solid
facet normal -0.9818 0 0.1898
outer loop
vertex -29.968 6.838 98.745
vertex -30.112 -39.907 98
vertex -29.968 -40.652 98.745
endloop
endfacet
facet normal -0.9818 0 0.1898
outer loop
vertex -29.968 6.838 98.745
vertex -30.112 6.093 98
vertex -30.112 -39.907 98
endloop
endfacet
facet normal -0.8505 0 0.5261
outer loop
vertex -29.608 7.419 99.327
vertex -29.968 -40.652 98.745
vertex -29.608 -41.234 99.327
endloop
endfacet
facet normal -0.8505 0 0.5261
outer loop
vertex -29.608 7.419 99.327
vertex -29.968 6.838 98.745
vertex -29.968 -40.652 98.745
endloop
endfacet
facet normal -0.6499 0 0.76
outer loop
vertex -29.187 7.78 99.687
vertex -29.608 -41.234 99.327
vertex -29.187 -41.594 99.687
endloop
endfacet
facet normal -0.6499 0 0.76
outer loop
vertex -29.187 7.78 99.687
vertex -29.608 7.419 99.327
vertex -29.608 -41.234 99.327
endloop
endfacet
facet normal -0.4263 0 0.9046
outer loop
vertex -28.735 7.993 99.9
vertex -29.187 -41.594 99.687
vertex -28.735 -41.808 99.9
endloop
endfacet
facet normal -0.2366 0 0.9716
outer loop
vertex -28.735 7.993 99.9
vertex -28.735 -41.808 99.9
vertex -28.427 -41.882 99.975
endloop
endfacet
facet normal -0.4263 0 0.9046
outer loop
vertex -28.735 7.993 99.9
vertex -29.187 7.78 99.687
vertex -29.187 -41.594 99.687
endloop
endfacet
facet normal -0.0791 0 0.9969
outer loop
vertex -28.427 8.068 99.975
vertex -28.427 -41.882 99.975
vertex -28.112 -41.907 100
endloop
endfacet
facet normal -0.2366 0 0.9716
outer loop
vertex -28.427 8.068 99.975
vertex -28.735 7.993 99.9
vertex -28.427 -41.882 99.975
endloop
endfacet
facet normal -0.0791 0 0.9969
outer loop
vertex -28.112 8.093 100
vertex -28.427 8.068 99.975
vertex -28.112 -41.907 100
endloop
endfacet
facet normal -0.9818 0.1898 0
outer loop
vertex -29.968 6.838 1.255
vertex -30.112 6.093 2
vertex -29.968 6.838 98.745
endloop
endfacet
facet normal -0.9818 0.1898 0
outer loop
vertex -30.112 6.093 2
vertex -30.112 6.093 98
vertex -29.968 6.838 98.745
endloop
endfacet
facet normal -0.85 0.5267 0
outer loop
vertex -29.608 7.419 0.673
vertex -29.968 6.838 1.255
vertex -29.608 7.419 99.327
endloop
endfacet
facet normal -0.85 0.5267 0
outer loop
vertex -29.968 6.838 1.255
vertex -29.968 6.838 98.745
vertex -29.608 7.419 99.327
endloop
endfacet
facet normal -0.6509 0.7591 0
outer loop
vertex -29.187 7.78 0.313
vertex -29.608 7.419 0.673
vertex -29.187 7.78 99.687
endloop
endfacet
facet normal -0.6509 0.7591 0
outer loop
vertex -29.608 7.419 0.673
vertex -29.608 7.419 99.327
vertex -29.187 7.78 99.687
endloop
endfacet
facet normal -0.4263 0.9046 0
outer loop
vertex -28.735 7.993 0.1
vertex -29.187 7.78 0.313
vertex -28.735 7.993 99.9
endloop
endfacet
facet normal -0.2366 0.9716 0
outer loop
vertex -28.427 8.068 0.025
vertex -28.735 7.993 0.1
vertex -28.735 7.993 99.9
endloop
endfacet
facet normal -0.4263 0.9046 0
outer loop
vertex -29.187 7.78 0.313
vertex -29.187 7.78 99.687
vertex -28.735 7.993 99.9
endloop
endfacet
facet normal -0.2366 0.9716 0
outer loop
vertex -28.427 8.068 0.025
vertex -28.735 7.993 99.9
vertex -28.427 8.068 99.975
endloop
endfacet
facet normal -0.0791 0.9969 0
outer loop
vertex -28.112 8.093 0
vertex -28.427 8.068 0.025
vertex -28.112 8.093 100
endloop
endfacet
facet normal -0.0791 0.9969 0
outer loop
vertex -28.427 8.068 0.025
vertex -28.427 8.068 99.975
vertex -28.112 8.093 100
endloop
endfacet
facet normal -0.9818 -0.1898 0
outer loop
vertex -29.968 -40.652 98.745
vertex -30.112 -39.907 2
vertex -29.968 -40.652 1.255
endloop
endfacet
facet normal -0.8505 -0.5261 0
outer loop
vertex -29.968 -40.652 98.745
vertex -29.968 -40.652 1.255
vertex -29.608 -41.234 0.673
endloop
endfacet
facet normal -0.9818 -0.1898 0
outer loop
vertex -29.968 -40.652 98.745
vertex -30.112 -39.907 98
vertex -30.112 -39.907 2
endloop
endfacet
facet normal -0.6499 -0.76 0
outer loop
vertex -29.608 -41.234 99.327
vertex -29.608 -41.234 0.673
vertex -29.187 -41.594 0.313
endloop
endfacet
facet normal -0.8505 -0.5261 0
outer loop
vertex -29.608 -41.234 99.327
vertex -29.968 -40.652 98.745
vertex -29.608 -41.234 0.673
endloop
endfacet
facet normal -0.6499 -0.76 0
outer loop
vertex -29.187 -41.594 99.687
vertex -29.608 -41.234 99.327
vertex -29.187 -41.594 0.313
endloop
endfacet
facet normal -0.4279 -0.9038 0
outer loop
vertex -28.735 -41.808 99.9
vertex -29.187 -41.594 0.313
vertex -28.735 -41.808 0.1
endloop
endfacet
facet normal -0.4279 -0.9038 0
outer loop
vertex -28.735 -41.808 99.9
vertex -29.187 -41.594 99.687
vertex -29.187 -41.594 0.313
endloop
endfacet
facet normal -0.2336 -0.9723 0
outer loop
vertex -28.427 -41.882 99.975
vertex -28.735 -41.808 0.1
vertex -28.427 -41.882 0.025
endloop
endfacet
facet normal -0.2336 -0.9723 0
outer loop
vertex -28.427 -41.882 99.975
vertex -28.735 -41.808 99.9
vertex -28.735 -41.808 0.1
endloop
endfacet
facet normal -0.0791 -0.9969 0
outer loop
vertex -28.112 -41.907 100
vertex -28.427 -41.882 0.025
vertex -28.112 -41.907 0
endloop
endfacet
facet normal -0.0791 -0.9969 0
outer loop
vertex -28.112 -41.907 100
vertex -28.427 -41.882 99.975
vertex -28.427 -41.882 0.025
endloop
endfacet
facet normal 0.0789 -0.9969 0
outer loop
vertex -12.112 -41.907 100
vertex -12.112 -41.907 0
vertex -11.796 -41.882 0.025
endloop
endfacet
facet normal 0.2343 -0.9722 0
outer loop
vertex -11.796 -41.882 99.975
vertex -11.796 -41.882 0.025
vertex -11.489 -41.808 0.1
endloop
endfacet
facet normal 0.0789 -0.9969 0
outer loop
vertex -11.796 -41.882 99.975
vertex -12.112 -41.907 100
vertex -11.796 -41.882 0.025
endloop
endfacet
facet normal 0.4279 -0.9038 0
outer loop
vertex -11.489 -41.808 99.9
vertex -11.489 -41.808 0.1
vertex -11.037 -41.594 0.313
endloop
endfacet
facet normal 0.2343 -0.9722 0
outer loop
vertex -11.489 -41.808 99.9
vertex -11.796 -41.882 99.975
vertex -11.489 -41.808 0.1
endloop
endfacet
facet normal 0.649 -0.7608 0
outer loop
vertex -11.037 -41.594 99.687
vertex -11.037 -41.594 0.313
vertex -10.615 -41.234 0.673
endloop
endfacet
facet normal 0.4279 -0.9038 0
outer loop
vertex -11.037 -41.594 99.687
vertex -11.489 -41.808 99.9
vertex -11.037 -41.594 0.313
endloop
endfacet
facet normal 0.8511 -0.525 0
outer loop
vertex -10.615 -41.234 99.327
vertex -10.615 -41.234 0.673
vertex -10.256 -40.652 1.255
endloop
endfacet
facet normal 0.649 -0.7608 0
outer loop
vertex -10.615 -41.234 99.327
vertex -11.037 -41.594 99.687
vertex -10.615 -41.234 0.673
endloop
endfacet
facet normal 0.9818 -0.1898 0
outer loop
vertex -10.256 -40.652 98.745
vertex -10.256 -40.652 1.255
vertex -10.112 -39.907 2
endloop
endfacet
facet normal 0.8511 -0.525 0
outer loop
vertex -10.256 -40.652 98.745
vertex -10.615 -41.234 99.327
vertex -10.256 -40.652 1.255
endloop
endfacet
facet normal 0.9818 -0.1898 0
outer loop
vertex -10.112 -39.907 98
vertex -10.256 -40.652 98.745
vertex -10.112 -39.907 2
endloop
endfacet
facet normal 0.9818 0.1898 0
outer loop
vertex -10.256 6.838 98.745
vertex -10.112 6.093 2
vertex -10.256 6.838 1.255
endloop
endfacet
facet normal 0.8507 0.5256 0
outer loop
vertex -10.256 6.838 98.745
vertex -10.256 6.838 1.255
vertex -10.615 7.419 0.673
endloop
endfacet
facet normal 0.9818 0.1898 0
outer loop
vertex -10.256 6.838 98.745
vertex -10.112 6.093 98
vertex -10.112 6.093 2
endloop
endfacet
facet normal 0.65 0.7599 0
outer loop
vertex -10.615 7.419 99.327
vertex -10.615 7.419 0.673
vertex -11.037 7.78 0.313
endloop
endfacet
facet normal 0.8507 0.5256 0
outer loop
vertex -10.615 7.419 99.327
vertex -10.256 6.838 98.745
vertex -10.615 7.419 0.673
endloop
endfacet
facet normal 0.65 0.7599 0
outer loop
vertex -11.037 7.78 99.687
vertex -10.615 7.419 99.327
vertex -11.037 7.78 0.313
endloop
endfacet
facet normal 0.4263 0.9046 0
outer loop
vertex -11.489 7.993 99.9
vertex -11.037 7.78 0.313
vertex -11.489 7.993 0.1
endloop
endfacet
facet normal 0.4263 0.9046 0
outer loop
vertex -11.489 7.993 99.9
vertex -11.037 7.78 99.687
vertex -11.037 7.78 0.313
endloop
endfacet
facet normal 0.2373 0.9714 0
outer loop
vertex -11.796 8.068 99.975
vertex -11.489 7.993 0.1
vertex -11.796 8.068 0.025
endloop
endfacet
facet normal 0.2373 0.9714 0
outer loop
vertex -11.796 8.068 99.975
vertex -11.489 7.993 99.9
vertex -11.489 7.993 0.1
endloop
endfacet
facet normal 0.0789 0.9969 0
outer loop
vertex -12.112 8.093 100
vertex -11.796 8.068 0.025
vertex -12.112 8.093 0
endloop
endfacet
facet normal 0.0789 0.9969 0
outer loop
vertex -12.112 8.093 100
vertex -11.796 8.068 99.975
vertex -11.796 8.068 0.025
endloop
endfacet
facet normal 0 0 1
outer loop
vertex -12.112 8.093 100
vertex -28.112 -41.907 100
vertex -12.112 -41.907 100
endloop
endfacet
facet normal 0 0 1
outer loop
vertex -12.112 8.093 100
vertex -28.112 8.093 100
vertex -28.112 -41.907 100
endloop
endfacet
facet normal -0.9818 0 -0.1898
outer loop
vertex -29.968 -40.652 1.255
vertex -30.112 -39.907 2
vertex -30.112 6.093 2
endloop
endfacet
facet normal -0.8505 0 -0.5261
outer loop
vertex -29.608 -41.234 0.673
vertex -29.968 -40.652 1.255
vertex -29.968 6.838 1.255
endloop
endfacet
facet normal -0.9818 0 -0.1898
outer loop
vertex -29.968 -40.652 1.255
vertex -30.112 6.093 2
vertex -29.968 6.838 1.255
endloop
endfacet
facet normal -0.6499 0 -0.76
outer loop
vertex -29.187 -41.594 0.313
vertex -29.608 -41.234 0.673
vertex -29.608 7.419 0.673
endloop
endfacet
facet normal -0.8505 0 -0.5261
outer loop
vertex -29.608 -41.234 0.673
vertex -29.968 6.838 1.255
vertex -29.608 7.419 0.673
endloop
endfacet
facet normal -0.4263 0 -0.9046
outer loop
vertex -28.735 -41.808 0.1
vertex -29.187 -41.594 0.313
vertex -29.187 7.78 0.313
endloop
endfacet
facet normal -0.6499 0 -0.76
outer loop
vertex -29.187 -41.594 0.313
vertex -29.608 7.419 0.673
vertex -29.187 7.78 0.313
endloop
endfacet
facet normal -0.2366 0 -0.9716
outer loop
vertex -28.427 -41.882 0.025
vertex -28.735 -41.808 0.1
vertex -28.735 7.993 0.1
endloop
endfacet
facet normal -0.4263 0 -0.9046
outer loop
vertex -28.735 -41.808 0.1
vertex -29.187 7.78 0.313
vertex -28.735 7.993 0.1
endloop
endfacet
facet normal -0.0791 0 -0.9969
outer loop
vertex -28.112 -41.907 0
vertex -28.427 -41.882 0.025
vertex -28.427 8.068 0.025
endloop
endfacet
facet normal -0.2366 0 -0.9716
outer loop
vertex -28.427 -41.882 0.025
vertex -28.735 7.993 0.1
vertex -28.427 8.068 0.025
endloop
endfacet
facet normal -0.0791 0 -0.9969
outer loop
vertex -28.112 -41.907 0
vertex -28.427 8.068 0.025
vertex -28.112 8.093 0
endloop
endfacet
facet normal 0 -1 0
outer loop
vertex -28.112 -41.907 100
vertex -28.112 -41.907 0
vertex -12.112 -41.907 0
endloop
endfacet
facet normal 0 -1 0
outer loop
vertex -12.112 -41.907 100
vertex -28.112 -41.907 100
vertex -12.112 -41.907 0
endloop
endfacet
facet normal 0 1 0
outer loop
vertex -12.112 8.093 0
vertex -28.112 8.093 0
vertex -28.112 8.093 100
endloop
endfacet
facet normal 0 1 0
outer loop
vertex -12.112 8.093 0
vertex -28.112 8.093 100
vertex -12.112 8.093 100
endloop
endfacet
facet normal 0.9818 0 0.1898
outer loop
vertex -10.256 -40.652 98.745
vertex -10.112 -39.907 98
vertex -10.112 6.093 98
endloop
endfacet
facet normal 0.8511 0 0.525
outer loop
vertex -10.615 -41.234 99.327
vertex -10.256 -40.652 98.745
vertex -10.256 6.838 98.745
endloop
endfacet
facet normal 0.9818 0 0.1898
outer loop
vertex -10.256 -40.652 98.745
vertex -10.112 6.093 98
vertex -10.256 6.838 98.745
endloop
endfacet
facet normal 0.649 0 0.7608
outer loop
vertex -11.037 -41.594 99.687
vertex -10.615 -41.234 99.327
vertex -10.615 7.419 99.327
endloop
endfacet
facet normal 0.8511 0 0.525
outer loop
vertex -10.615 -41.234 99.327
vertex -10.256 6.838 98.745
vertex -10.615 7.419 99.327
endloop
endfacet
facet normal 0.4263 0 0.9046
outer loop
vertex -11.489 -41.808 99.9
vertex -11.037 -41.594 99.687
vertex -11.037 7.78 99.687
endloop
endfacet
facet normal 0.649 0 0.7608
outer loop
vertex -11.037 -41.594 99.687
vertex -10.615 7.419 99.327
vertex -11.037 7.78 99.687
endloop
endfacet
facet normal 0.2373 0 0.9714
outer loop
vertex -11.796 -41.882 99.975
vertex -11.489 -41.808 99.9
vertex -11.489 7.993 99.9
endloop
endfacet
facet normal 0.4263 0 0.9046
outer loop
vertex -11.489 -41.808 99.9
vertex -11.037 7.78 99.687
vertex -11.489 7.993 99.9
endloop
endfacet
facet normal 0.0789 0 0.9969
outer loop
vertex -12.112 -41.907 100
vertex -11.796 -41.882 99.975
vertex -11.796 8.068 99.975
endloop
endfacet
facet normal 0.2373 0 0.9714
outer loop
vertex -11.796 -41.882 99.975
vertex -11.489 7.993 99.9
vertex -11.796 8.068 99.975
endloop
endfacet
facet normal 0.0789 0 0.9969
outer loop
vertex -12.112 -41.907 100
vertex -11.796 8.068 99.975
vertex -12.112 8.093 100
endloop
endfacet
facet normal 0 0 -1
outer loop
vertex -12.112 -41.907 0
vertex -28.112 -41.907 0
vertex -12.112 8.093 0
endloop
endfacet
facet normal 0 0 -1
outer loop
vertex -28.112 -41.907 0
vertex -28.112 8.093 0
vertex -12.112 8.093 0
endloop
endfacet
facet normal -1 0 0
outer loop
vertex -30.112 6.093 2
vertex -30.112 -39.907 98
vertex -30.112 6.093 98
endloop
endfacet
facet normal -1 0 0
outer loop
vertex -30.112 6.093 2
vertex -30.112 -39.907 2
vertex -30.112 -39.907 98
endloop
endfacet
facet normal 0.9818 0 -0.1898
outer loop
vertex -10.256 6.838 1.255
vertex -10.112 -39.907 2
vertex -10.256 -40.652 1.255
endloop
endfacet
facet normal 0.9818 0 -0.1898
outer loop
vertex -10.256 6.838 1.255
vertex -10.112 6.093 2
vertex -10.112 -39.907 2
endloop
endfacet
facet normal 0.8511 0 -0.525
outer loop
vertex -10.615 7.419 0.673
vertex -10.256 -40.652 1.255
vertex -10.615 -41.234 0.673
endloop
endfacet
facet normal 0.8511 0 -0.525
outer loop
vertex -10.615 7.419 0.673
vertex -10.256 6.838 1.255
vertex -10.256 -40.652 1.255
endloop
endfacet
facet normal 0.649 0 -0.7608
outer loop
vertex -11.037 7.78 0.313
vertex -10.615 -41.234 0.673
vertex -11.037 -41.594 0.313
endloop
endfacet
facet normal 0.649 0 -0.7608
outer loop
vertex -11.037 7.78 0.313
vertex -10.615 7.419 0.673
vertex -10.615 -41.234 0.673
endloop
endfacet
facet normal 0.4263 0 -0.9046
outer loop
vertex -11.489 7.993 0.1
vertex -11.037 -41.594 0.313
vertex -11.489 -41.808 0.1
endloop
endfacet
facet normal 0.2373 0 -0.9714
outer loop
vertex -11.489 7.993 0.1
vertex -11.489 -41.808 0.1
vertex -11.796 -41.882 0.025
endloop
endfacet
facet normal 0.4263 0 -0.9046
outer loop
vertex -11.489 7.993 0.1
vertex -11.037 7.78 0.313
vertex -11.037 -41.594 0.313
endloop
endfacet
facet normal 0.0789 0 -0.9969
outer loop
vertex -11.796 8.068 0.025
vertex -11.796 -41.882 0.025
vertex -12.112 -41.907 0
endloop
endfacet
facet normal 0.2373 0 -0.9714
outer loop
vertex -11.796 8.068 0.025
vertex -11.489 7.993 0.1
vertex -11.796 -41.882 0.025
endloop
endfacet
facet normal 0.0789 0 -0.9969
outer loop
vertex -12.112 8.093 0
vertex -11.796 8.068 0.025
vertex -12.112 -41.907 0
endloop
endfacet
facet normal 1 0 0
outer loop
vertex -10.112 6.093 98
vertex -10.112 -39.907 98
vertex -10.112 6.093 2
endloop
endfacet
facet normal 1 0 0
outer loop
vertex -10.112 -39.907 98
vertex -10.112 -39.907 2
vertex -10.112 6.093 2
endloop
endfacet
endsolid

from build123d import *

# Parameters (mm, degrees)
CROQUIS1_W              = 20
CROQUIS1_H              = 50
SALIENTE_EXTRUIR1_DEPTH = 100
REDONDEO1_R             = 2


with BuildPart() as part:
    # Croquis1 → Saliente-Extruir1 (new body)
    with BuildSketch(Plane.XY):
        with Locations((-20.111803819, -16.907191939)):
            Rectangle(CROQUIS1_W, CROQUIS1_H)
    extrude(amount=SALIENTE_EXTRUIR1_DEPTH)

    # Redondeo1
    redondeo1_edges = [part.edges().sort_by_distance(p)[0] for p in [
        (-10.111803819, -16.907191939, 100),
        (-30.111803819, -16.907191939, 100),
        (-10.111803819, -16.907191939, 0),
        (-30.111803819, -16.907191939, 0),
        (-30.111803819, 8.092808061, 50),
        (-10.111803819, 8.092808061, 50),
        (-10.111803819, -41.907191939, 50),
        (-30.111803819, -41.907191939, 50),
    ]]
    fillet(redondeo1_edges, radius=REDONDEO1_R)


solid = part.part
